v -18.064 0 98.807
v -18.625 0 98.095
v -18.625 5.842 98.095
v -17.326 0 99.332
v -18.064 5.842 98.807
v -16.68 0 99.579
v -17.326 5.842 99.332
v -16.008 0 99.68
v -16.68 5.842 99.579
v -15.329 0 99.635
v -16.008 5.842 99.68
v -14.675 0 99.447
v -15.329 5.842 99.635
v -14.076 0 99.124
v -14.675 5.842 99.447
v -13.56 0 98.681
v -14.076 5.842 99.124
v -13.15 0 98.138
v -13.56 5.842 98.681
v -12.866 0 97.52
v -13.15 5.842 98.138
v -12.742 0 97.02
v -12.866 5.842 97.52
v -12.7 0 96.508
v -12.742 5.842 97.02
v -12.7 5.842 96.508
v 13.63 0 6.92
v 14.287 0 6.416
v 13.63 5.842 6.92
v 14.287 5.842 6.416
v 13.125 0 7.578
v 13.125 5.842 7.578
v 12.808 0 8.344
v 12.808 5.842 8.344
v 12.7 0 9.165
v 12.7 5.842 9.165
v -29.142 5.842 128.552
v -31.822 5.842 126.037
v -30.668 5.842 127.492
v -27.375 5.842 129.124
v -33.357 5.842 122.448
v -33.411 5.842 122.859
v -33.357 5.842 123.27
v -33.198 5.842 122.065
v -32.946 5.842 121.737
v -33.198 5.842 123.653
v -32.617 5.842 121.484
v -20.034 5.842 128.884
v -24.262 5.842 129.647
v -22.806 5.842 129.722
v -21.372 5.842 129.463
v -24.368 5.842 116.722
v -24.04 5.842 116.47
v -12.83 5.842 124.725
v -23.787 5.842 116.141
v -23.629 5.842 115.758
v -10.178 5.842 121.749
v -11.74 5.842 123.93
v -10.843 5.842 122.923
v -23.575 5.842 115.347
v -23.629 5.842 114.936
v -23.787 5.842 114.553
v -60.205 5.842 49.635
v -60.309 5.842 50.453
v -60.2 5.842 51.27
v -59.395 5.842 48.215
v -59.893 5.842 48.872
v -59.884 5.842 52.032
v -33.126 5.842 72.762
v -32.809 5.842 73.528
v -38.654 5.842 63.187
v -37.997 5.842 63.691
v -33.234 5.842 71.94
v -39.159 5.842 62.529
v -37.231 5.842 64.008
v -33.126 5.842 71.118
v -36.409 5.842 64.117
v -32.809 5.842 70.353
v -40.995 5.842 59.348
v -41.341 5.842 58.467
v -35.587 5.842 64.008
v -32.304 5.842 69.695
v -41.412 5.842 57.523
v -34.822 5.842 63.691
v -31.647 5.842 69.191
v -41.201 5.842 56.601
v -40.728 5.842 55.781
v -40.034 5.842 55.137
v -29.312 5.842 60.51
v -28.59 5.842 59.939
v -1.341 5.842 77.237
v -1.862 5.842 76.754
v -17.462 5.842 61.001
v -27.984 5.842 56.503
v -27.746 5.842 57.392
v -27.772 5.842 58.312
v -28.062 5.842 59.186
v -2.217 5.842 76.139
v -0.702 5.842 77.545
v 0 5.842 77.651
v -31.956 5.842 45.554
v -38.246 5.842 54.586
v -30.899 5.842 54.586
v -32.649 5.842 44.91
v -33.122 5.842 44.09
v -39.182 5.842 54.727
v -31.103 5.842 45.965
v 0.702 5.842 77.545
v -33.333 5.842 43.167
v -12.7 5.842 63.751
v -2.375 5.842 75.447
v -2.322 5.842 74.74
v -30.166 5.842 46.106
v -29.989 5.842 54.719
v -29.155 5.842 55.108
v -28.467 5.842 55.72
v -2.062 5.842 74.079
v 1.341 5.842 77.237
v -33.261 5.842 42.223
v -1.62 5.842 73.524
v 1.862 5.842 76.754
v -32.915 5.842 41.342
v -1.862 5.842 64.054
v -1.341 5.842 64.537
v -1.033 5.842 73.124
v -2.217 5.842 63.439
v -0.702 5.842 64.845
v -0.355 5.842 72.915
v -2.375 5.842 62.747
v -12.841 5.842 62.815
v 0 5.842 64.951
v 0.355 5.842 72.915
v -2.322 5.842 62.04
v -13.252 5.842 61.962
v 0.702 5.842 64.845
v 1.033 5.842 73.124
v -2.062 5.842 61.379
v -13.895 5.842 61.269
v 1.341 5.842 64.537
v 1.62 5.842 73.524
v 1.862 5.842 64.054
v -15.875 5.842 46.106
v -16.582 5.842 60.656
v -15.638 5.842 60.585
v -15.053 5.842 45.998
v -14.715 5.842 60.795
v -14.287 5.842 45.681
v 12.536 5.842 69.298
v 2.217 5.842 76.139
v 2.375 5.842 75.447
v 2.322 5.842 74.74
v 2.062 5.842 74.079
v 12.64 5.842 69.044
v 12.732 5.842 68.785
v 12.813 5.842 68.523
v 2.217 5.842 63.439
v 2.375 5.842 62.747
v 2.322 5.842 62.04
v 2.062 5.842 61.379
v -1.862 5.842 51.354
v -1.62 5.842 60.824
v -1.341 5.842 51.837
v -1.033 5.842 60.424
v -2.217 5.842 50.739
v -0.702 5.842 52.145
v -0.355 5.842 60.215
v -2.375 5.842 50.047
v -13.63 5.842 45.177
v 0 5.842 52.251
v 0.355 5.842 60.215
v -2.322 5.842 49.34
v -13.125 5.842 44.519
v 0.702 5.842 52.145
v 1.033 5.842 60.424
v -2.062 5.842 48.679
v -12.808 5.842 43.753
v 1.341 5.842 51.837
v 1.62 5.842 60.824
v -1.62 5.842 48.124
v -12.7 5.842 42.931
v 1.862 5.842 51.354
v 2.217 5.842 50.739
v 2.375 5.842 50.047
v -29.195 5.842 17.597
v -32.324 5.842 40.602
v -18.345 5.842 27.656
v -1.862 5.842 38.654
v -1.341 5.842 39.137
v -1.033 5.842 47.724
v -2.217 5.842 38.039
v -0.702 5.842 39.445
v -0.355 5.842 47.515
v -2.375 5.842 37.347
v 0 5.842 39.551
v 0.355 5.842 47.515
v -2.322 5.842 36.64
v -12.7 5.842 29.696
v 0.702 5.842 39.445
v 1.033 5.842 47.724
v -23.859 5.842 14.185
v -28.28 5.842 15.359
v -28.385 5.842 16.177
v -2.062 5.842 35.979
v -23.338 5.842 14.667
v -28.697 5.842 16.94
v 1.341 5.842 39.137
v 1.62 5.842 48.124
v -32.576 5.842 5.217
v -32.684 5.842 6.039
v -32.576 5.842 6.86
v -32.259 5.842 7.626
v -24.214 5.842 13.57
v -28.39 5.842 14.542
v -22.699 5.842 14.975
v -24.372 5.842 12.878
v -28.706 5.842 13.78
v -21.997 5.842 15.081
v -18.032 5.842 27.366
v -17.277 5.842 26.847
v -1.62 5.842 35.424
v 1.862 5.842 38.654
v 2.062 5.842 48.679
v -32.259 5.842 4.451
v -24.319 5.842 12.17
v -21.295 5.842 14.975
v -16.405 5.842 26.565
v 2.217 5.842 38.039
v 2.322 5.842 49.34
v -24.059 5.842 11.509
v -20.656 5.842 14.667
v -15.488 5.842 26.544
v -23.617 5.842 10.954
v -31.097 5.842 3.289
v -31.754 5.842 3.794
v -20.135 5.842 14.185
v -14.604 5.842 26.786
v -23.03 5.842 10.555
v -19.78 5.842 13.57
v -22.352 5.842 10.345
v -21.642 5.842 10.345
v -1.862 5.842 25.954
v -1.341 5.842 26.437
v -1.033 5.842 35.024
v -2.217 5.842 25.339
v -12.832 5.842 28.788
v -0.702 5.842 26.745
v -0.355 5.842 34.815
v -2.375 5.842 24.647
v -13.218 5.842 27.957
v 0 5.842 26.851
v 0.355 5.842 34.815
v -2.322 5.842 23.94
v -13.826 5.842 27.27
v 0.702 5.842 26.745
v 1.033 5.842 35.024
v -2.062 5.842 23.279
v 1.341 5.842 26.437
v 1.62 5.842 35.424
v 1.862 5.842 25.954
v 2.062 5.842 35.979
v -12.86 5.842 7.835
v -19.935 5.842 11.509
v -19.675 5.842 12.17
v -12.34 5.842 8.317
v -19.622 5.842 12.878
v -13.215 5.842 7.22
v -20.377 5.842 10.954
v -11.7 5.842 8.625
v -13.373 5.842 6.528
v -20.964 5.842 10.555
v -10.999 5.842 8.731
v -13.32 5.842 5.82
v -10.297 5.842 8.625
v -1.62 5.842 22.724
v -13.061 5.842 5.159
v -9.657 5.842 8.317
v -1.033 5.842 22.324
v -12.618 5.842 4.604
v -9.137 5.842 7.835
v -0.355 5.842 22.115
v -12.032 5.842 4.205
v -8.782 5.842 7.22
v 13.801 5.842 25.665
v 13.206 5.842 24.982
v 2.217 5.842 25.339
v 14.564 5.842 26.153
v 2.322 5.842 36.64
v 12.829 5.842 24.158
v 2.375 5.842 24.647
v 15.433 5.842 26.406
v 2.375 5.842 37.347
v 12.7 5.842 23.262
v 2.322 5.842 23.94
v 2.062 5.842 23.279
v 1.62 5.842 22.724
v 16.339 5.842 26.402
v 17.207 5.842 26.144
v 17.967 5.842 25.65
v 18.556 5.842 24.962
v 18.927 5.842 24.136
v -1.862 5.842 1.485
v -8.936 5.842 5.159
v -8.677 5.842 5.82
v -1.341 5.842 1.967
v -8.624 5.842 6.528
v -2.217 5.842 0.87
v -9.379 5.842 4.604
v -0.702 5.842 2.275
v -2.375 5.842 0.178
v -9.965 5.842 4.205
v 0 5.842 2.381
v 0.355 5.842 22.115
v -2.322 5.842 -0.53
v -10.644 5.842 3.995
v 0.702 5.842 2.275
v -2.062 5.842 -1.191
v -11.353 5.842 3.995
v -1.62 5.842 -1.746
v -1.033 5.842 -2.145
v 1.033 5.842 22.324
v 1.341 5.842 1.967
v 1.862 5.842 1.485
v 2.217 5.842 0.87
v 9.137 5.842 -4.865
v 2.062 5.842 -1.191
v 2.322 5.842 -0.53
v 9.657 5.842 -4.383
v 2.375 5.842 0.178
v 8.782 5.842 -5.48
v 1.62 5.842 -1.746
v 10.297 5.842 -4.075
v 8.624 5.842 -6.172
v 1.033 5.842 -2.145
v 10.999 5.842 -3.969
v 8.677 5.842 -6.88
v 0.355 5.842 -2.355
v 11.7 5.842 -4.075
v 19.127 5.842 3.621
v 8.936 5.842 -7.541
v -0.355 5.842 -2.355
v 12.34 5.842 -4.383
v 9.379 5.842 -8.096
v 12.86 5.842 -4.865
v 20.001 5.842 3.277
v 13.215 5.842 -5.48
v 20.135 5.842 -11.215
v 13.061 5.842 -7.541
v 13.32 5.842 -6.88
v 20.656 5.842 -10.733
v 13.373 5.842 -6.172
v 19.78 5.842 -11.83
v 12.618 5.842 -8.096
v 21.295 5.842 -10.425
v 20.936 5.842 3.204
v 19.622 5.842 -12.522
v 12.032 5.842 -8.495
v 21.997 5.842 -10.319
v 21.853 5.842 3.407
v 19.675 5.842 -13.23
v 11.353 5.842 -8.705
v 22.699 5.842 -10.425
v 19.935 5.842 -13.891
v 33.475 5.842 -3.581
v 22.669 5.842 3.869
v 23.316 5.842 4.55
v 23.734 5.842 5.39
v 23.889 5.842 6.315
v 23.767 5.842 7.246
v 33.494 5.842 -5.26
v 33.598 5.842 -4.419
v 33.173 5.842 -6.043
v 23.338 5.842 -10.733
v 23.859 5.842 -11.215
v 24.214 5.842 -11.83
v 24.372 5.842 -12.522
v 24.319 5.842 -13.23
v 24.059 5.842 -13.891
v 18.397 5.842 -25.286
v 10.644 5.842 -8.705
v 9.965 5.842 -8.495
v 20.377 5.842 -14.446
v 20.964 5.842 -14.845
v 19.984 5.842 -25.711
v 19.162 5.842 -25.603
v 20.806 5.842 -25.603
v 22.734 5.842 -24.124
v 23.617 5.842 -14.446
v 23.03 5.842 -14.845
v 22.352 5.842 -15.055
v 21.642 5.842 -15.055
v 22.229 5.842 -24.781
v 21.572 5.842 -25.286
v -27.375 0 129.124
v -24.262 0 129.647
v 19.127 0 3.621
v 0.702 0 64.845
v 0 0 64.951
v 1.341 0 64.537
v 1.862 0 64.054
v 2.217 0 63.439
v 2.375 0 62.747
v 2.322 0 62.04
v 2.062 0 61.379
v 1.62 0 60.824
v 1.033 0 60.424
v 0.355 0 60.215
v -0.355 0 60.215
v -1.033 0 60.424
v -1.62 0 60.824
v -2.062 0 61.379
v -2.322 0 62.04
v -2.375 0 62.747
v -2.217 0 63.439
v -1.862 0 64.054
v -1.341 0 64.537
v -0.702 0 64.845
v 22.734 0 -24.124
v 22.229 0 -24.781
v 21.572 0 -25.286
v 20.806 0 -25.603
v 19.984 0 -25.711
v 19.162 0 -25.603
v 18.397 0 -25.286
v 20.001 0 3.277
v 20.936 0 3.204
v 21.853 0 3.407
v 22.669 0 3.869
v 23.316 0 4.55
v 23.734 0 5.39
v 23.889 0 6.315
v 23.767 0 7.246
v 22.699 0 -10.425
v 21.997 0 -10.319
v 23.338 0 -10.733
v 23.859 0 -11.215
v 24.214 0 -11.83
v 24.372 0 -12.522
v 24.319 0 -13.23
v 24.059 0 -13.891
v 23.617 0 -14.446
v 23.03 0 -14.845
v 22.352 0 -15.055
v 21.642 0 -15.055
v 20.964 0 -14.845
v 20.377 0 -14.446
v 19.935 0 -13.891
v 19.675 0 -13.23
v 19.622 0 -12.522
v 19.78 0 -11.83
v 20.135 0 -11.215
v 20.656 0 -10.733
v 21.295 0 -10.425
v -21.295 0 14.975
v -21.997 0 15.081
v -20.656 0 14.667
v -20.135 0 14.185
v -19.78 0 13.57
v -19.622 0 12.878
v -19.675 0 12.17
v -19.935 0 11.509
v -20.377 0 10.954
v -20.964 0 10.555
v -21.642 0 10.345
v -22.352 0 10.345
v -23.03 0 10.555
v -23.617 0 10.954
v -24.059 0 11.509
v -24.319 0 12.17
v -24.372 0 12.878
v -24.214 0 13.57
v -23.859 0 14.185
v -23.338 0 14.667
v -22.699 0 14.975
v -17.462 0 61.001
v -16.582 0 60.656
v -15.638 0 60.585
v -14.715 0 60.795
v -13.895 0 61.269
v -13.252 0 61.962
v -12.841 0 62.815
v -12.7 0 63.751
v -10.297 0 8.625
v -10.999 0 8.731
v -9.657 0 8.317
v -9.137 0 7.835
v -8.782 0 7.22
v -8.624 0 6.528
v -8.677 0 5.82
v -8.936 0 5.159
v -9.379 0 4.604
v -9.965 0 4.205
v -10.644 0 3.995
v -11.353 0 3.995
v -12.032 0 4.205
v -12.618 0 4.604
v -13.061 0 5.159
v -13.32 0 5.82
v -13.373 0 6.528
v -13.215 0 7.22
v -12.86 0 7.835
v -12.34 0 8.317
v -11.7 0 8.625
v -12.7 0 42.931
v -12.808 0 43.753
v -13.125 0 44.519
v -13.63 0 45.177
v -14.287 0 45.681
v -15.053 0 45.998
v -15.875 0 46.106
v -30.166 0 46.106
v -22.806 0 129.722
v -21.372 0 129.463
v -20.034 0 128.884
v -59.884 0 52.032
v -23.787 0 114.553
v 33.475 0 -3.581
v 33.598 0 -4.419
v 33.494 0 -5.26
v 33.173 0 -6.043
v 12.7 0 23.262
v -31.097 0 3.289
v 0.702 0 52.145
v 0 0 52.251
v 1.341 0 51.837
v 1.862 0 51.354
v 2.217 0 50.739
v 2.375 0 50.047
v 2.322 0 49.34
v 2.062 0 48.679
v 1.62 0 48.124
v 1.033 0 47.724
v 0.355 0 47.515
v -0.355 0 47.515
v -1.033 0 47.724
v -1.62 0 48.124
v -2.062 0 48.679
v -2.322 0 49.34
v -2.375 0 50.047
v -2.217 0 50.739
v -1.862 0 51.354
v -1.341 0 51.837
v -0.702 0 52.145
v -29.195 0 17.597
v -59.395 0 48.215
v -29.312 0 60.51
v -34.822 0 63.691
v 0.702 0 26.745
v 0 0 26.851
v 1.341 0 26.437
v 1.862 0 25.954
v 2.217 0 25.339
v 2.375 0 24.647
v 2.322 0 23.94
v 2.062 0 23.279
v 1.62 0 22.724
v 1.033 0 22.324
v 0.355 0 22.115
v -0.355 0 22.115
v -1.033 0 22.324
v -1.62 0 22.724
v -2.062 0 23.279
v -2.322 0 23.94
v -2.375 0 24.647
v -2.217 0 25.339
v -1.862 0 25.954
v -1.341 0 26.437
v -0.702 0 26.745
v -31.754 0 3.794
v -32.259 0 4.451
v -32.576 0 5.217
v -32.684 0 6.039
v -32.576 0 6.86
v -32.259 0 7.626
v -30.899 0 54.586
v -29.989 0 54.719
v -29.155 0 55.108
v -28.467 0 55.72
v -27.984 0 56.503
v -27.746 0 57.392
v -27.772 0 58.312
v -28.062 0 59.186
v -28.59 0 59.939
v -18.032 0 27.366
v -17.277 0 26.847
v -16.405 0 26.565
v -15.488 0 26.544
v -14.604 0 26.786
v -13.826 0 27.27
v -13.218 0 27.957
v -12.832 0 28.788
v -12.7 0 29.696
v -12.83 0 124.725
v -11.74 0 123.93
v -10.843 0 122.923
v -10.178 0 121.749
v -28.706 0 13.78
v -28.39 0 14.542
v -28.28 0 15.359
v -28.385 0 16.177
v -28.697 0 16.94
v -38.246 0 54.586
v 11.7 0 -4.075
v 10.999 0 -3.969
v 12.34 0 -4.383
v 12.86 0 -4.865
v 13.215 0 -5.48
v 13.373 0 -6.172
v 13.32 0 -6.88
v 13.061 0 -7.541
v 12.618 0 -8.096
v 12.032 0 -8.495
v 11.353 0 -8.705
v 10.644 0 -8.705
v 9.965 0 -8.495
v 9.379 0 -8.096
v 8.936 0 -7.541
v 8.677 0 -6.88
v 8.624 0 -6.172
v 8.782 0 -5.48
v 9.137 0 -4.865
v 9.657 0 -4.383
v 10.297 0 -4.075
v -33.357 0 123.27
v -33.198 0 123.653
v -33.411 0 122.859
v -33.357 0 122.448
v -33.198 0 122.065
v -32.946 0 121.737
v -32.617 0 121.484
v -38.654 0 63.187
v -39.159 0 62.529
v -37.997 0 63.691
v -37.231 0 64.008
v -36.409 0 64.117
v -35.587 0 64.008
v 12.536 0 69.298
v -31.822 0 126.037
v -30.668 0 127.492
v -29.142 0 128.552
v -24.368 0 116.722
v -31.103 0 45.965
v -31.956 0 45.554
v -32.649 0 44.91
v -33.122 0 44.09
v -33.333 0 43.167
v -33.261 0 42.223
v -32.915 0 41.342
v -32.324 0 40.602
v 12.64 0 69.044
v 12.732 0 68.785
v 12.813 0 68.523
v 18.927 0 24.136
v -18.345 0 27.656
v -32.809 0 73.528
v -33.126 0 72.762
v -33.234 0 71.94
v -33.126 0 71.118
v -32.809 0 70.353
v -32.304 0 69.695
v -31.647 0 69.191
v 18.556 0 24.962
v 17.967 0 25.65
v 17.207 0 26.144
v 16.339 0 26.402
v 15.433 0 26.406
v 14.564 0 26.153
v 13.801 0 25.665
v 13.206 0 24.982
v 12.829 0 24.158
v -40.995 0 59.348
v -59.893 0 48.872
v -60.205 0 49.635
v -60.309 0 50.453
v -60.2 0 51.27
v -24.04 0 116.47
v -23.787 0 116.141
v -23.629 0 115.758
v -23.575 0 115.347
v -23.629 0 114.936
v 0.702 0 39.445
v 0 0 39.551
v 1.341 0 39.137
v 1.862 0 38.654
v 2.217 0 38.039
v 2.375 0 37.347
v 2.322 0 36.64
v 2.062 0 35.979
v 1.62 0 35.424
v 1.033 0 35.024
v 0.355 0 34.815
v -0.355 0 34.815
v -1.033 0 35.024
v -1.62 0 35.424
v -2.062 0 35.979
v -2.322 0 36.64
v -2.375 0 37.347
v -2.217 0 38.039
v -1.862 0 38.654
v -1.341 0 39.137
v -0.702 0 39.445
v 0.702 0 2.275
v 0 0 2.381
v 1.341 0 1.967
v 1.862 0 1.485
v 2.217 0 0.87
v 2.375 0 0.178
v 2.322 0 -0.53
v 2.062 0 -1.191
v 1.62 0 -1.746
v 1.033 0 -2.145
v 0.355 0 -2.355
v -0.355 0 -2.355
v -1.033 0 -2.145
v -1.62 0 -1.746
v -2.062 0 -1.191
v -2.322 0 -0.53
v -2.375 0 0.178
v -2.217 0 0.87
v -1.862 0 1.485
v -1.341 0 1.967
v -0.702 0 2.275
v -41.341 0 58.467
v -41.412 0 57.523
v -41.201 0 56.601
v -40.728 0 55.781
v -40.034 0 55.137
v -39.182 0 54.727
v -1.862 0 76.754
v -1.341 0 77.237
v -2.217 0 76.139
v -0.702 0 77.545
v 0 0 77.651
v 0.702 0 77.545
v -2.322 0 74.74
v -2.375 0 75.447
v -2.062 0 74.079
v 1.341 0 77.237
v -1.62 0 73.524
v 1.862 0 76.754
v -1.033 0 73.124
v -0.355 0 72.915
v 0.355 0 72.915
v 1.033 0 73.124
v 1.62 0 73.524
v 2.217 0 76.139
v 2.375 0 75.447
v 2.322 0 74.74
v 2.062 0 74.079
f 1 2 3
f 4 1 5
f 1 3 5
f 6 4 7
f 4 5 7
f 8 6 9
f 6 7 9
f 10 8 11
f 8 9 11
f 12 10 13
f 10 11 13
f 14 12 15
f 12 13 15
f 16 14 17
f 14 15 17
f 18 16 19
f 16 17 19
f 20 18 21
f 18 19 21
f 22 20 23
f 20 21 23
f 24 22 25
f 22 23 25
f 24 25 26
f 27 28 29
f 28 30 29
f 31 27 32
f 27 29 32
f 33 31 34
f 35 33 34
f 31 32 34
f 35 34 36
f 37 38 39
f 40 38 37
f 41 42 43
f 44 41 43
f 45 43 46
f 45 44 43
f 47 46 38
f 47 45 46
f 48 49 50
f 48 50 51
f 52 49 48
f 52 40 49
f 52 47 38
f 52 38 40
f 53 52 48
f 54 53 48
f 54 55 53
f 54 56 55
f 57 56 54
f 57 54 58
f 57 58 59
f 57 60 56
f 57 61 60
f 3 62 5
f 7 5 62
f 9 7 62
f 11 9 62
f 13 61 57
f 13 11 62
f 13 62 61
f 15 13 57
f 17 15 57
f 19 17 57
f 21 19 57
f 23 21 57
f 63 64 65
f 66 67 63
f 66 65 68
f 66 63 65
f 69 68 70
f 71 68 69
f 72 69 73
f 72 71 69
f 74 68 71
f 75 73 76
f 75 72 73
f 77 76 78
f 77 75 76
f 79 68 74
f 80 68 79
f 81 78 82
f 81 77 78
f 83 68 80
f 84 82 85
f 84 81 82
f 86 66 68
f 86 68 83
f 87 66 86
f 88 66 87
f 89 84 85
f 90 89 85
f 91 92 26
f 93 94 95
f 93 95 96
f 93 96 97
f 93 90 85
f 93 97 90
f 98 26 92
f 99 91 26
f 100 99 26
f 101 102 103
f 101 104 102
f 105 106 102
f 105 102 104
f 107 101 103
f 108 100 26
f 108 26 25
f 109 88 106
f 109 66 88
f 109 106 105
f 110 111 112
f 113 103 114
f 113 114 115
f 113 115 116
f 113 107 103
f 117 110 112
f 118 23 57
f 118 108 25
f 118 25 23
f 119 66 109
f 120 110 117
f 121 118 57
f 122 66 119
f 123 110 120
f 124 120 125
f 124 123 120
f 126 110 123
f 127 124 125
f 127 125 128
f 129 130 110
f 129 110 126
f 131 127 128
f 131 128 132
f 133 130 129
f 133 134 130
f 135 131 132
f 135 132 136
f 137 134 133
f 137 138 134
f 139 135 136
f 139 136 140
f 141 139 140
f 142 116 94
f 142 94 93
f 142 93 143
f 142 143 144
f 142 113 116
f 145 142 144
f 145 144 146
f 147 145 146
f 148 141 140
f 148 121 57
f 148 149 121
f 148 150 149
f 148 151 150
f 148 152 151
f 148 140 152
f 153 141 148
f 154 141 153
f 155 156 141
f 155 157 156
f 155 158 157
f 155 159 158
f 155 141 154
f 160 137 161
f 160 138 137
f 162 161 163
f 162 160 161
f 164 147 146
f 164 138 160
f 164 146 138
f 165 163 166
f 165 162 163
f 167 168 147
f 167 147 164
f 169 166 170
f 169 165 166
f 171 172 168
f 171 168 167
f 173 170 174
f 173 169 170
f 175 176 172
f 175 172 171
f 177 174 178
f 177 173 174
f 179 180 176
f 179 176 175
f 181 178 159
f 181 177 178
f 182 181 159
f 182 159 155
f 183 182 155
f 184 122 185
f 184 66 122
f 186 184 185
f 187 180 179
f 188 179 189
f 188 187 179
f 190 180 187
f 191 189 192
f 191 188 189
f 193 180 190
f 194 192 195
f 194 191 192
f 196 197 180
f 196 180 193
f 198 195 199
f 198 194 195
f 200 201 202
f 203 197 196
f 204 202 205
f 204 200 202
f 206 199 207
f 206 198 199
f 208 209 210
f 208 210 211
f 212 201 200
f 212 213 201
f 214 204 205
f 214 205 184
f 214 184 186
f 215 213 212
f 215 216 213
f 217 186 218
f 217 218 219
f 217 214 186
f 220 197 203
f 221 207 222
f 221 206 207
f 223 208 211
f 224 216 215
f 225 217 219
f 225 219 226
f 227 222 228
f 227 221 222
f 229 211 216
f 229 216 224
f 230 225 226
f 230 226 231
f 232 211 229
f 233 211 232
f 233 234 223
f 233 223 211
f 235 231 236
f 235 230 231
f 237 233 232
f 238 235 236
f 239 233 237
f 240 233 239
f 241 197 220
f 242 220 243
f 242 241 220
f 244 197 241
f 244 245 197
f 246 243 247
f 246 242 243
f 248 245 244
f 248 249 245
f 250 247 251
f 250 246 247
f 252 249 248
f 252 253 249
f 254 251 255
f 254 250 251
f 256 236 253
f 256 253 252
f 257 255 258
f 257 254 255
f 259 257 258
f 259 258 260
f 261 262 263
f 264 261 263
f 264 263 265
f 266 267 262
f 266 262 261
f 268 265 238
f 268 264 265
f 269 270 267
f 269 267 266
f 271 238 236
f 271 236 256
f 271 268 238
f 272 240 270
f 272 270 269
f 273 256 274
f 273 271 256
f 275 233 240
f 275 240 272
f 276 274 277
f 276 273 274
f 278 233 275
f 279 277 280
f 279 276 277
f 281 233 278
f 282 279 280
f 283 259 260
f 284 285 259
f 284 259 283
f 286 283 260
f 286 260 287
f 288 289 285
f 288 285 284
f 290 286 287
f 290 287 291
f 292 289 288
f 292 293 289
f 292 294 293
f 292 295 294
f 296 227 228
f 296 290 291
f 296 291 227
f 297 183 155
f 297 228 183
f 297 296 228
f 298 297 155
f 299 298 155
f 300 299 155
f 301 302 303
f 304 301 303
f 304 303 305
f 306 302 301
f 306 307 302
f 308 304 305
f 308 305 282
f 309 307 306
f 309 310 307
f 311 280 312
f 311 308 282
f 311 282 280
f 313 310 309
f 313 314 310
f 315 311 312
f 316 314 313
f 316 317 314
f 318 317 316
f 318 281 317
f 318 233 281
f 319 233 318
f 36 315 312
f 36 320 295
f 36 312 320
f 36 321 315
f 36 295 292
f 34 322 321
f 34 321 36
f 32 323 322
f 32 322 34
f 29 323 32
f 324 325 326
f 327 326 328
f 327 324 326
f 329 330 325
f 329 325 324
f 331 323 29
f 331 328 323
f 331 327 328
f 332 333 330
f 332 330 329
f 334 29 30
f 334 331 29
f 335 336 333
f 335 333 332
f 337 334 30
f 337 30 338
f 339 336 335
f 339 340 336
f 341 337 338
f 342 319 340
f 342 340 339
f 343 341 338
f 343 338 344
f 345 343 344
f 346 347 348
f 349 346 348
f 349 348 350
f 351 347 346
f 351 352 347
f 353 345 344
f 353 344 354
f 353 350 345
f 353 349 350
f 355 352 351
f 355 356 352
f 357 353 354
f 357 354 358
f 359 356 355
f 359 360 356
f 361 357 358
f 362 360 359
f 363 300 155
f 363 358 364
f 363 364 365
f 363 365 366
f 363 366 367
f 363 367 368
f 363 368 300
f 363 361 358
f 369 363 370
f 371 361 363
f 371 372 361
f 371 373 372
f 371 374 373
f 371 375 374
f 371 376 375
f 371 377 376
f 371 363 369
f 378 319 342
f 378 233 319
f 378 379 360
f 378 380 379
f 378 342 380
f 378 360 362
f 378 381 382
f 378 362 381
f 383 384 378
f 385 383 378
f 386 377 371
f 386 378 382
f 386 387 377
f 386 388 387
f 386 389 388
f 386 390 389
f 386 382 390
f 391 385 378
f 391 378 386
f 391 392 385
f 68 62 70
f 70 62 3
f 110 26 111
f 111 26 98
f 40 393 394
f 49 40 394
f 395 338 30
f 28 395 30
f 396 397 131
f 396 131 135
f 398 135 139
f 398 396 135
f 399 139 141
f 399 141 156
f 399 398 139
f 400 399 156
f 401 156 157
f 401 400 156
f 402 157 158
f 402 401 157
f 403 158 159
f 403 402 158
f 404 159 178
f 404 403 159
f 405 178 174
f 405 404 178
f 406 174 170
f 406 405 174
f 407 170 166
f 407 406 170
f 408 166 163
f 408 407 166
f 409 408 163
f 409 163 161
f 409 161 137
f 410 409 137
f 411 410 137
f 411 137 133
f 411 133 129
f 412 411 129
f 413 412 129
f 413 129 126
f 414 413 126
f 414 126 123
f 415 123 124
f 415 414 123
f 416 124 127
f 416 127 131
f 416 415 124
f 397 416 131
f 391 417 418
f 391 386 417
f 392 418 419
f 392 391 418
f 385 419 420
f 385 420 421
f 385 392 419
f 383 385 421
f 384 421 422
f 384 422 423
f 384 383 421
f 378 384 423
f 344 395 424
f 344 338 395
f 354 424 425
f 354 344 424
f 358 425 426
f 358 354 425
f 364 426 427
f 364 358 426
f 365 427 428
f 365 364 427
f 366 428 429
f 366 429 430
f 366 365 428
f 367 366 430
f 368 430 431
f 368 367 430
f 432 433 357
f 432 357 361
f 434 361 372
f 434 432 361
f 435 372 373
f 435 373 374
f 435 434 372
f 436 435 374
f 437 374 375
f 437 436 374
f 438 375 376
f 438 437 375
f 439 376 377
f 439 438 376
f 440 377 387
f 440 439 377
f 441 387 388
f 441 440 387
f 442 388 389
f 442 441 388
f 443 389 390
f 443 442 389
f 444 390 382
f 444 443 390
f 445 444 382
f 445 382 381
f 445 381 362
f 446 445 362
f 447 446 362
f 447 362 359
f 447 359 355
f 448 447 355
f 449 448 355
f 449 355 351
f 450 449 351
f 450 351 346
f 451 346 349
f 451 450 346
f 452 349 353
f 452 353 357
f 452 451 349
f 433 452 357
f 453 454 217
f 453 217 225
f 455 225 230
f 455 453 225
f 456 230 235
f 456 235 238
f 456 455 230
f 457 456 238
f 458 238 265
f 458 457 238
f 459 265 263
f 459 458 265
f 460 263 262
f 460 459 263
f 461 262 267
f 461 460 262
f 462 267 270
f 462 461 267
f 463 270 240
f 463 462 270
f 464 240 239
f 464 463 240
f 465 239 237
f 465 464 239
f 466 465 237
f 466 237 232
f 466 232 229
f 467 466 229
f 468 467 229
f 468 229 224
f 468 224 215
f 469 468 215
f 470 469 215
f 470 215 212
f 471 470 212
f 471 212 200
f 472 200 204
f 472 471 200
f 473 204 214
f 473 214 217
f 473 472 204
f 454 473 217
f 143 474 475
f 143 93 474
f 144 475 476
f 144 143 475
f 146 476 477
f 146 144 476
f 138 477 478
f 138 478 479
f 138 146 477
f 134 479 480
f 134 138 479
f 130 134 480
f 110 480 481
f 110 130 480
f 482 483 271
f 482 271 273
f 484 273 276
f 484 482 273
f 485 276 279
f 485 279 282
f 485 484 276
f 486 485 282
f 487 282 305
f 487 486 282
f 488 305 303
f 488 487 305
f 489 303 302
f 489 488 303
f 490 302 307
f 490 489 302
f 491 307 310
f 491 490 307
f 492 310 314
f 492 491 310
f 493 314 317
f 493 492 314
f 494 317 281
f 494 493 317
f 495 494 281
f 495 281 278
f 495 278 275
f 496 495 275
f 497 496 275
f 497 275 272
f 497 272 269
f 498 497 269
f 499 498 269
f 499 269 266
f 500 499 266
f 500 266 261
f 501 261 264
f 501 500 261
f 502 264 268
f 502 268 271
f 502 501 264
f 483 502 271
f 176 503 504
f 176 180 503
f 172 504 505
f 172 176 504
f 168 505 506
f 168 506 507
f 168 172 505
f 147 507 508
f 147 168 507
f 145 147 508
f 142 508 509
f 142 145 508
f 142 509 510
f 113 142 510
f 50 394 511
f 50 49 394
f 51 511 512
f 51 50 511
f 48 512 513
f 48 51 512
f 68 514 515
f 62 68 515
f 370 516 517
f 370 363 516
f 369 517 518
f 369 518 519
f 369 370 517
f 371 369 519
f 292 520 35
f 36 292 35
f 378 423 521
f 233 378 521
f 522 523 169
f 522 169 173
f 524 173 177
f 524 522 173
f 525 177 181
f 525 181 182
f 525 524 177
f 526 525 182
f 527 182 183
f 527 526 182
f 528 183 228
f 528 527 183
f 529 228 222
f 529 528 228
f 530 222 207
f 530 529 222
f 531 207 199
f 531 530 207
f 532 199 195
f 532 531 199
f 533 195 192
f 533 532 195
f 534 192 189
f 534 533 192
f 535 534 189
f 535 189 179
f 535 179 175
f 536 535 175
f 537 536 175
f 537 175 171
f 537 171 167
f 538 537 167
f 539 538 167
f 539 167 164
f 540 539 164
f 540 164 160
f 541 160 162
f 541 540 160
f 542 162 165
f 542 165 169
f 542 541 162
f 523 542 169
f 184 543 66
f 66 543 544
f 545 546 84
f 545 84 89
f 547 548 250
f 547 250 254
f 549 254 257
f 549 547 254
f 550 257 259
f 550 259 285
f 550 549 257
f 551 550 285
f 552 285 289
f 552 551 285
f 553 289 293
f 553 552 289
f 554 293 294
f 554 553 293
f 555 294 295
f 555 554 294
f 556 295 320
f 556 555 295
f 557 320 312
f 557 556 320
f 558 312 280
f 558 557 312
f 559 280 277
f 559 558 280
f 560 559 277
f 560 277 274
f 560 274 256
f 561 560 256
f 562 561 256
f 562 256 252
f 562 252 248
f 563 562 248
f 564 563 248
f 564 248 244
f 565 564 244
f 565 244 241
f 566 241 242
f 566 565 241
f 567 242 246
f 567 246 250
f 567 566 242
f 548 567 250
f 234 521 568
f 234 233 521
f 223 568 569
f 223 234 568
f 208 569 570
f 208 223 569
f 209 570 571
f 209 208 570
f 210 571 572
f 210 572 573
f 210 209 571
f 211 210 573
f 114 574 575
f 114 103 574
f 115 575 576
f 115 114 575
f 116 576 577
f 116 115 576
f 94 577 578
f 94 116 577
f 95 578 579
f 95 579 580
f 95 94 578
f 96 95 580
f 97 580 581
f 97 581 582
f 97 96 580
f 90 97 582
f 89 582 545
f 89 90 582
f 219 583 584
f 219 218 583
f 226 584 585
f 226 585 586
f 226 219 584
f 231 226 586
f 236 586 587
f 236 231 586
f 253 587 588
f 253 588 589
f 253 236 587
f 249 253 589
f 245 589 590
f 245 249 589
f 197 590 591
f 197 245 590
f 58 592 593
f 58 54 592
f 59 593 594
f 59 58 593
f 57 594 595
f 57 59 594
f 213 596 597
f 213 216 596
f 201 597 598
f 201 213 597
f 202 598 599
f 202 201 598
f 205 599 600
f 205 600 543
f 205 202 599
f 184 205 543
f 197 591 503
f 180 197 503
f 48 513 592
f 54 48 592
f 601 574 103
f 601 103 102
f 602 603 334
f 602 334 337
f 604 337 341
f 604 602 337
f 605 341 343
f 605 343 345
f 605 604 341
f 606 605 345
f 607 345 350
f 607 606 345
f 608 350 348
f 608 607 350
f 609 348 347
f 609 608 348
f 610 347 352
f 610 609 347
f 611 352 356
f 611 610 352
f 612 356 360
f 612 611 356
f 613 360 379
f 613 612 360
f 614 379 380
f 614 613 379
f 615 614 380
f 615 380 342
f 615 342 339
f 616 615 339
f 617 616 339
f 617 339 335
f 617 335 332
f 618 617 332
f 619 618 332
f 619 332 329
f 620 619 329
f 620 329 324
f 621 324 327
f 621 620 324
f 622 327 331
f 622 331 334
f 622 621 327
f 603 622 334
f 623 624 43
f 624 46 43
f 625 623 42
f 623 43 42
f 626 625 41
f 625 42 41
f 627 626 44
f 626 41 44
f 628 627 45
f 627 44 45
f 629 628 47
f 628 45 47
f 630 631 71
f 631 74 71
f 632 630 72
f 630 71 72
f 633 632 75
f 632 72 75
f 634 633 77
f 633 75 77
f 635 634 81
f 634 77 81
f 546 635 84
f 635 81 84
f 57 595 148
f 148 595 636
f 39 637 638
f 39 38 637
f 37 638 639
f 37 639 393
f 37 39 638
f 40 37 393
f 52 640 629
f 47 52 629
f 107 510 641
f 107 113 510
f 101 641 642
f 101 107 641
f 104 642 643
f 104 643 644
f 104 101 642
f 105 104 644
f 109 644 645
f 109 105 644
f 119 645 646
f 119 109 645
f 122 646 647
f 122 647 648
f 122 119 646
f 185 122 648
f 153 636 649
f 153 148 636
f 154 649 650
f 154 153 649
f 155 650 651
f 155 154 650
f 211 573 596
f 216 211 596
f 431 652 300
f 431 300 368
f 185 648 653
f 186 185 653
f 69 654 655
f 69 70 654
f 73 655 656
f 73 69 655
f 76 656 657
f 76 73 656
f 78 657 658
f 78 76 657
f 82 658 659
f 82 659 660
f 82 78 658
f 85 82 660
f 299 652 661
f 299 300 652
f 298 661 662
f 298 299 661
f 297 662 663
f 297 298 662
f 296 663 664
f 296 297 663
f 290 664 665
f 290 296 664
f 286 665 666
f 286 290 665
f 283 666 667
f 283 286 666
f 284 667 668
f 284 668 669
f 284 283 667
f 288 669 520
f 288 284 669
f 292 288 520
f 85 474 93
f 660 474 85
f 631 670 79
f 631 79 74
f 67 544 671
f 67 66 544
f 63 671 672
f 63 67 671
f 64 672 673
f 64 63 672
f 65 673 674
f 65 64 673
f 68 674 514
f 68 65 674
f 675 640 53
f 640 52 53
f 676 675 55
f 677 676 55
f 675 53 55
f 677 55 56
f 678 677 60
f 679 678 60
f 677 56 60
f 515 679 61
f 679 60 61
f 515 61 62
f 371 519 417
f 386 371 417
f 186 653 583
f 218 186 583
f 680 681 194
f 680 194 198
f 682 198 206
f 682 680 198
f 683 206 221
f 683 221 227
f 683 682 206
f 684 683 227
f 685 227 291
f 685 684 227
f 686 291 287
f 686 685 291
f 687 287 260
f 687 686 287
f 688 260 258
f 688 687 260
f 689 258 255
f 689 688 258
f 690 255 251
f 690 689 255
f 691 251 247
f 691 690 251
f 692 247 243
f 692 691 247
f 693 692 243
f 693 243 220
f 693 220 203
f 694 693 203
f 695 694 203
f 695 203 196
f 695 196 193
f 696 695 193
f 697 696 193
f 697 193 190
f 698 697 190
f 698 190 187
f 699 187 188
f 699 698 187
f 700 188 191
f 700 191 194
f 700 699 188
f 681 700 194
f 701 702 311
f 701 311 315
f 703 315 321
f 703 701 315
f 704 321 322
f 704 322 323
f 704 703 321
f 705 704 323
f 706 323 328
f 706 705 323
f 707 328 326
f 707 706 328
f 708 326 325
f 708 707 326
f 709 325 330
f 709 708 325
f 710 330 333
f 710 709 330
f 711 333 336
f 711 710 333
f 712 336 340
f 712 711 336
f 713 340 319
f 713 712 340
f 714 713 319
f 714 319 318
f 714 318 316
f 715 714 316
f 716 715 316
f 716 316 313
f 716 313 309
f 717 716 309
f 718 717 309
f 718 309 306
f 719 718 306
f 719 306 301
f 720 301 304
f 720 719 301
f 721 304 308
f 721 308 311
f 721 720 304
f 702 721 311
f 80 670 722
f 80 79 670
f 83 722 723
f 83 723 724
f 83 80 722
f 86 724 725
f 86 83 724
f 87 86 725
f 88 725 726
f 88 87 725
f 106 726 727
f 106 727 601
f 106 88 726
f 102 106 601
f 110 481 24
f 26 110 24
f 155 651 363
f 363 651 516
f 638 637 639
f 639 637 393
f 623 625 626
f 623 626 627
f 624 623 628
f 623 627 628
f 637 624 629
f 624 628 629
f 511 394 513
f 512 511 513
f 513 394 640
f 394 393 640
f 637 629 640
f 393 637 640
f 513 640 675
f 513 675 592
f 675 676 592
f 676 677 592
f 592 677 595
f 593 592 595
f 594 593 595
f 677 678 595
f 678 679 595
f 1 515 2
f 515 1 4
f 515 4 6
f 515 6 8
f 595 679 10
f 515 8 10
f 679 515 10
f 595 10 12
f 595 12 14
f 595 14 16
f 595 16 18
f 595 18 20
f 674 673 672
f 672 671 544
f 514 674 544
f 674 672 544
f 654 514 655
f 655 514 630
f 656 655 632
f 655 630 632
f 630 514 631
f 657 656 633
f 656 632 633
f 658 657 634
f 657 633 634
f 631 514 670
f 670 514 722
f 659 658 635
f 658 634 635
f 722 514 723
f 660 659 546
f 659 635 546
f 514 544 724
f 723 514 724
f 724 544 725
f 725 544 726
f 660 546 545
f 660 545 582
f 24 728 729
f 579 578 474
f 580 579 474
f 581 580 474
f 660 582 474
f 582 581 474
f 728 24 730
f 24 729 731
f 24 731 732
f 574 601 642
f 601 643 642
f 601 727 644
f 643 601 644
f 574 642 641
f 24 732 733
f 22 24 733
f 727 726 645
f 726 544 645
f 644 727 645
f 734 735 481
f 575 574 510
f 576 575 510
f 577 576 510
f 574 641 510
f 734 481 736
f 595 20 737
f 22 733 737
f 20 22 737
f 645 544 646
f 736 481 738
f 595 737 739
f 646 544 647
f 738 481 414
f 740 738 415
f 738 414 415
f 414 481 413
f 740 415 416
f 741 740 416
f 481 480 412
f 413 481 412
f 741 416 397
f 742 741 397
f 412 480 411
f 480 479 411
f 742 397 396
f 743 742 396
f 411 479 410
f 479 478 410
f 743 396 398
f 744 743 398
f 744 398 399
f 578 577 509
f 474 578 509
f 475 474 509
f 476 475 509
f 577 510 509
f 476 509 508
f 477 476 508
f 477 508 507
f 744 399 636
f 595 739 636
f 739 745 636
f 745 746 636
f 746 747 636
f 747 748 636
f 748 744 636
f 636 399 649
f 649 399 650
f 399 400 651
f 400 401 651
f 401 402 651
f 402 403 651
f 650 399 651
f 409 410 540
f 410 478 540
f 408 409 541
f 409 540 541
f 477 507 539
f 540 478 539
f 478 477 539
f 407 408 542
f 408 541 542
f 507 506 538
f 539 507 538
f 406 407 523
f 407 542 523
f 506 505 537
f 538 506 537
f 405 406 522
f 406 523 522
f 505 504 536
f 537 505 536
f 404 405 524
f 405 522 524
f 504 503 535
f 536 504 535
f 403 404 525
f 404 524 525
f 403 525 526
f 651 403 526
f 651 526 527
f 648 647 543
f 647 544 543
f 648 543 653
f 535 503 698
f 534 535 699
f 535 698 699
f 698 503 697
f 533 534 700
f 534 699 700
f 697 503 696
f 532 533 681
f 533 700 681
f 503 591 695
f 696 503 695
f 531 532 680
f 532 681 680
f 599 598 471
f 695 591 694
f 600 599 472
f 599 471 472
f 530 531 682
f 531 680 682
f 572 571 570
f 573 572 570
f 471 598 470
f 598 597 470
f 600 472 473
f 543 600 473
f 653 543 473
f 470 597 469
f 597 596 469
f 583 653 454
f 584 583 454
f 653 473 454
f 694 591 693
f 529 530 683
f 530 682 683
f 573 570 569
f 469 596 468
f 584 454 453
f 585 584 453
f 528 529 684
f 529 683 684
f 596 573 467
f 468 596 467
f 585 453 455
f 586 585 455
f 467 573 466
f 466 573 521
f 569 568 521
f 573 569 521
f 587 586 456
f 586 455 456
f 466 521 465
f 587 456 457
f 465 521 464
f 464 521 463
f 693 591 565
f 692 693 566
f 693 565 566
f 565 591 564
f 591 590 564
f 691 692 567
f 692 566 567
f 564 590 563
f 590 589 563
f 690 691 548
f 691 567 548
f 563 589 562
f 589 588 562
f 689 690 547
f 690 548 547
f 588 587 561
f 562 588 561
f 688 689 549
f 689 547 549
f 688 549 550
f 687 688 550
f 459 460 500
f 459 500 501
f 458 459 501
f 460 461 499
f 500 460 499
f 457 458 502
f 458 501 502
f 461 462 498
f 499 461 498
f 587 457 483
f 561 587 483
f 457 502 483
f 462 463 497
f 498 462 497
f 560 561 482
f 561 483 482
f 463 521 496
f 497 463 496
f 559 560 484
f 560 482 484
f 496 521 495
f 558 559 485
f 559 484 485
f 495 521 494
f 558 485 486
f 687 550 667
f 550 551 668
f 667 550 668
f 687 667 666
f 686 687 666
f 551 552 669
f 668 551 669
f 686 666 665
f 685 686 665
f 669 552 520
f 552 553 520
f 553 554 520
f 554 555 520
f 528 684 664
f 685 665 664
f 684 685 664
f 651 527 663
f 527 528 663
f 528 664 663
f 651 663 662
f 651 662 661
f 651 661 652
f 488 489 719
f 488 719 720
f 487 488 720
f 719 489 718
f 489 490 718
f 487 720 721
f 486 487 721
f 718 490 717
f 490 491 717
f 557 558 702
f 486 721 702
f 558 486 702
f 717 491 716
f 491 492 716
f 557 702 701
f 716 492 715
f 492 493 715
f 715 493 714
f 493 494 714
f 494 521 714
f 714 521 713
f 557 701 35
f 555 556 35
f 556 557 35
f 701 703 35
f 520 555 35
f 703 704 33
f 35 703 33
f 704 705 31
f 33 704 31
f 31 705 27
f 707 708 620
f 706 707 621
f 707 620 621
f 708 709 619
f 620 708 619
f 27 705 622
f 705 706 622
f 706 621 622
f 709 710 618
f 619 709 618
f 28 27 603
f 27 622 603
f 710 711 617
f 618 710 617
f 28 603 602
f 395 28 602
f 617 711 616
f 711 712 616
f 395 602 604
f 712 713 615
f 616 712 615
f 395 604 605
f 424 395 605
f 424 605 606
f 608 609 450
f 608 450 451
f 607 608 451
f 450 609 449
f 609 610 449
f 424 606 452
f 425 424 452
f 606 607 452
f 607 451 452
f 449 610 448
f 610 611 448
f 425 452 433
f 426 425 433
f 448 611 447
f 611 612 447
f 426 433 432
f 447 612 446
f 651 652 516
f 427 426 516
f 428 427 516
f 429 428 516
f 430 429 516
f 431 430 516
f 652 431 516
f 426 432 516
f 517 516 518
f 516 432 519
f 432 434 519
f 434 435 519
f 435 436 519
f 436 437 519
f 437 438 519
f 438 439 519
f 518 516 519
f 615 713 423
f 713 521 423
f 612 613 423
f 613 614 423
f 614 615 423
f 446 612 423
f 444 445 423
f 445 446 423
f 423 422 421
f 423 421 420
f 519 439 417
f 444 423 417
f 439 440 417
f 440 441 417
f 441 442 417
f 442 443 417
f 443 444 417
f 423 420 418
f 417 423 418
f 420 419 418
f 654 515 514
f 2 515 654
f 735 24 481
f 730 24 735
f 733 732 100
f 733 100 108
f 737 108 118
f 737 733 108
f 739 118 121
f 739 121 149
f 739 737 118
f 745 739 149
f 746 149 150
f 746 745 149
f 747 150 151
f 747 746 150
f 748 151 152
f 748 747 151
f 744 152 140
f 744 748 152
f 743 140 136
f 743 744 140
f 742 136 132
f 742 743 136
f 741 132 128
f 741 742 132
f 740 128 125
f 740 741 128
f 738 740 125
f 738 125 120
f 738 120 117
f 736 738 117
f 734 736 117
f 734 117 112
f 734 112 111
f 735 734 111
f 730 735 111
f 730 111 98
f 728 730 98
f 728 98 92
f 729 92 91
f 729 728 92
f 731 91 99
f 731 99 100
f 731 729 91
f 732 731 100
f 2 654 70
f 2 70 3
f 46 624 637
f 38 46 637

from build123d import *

# Parameters (mm, degrees)
SKETCH1_R           = 2.38125
BOSS_EXTRUDE1_DEPTH = 5.842
FILLET1_R           = 3.175
FILLET2_R           = 3.175
FILLET3_R           = 1.5875
FILLET5_R           = 6.35


with BuildPart() as part:
    # Sketch1 → Boss-Extrude1 (new body)
    with BuildSketch(Plane(origin=(0, 0, 0), x_dir=(1, 0, 0), z_dir=(0, 1, 0))):
        Polygon((-11.01238397, -123.675577549), (12.699883629, -68.919434524), (33.84630657, 4.876477372), (21.14630657, 26.873522628), (-33.84630657, -4.876477372), (-27.49630657, -15.875), (-61.093499563, -49.937045256), (-22.993499563, -115.928181024), (-33.992022192, -122.278181024), (-30.325847982, -128.628181024), (-22.010906598, -130.025577549), align=None)
        with Locations(Location((21.997045256, 12.7, 0), (0, 0, 270))):
            Circle(SKETCH1_R, mode=Mode.SUBTRACT)
        with Locations(Location((10.998522628, 6.35, 0), (0, 0, 270))):
            Circle(SKETCH1_R, mode=Mode.SUBTRACT)
        with Locations(Location((0, 0, 0), (0, 0, 270))):
            Circle(SKETCH1_R, mode=Mode.SUBTRACT)
        with Locations(Location((-10.998522628, -6.35, 0), (0, 0, 270))):
            Circle(SKETCH1_R, mode=Mode.SUBTRACT)
        with Locations(Location((-21.997045256, -12.7, 0), (0, 0, 270))):
            Circle(SKETCH1_R, mode=Mode.SUBTRACT)
        with Locations(Location((0, -24.4695218, 0), (0, 0, 270))):
            Circle(SKETCH1_R, mode=Mode.SUBTRACT)
        with Locations(Location((0, -37.1695218, 0), (0, 0, 270))):
            Circle(SKETCH1_R, mode=Mode.SUBTRACT)
        with Locations(Location((0, -49.8695218, 0), (0, 0, 270))):
            Circle(SKETCH1_R, mode=Mode.SUBTRACT)
        with Locations(Location((0, -62.5695218, 0), (0, 0, 270))):
            Circle(SKETCH1_R, mode=Mode.SUBTRACT)
        with Locations(Location((0, -75.2695218, 0), (0, 0, 270))):
            Circle(SKETCH1_R, mode=Mode.SUBTRACT)
        Polygon((25.931282224, 0.306735935), (12.7, -7.332348419), (12.7, -16.277642723), (12.7, -45.867554067), align=None, mode=Mode.SUBTRACT)
        Polygon((-43.744976935, -54.585567884), (-37.571232702, -65.27880657), (-19.05, -54.585567884), align=None, mode=Mode.SUBTRACT)
        Polygon((-12.7, -22.427495922), (-12.7, -46.106477151), (-18.344976935, -46.106477151), (-38.267154833, -46.106477151), (-18.344976935, -27.655582651), align=None, mode=Mode.SUBTRACT)
        Polygon((-18.344976935, -98.579658396), (-12.7, -108.357045256), (-12.7, -101.6), (-12.7, -58.251742094), (-34.396232702, -70.778067884), align=None, mode=Mode.SUBTRACT)
    extrude(amount=BOSS_EXTRUDE1_DEPTH)

    # Fillet1
    fillet1_edges = [part.edges().sort_by_distance(p)[0] for p in [
        (-19.05, 2.921, 54.585567884),
        (-43.744976935, 2.921, 54.585567884),
        (-37.571232702, 2.921, 65.27880657),
        (12.7, 2.921, 7.332348419),
        (12.7, 2.921, 45.867554067),
        (25.931282224, 2.921, -0.306735935),
        (-34.396232702, 2.921, 70.778067884),
        (-12.7, 2.921, 108.357045256),
        (-12.7, 2.921, 58.251742094),
        (-12.7, 2.921, 46.106477151),
        (-12.7, 2.921, 22.427495922),
        (-38.267154833, 2.921, 46.106477151),
    ]]
    fillet(fillet1_edges, radius=FILLET1_R)

    # Fillet2
    fillet2_edges = [part.edges().sort_by_distance(p)[0] for p in [
        (-33.84630657, 2.921, 4.876477372),
        (21.14630657, 2.921, -26.873522628),
        (33.84630657, 2.921, -4.876477372),
        (-61.093499563, 2.921, 49.937045256),
        (-27.49630657, 2.921, 15.875),
    ]]
    fillet(fillet2_edges, radius=FILLET2_R)

    # Fillet3
    fillet3_edges = [part.edges().sort_by_distance(p)[0] for p in [
        (-33.992022192, 2.921, 122.278181024),
        (-22.993499563, 2.921, 115.928181024),
    ]]
    fillet(fillet3_edges, radius=FILLET3_R)

    # Fillet5
    fillet5_edges = [part.edges().sort_by_distance(p)[0] for p in [
        (12.699883629, 2.921, 68.919434524),
        (-11.01238397, 2.921, 123.675577549),
        (-22.010906598, 2.921, 130.025577549),
        (-30.325847982, 2.921, 128.628181024),
    ]]
    fillet(fillet5_edges, radius=FILLET5_R)


solid = part.part
